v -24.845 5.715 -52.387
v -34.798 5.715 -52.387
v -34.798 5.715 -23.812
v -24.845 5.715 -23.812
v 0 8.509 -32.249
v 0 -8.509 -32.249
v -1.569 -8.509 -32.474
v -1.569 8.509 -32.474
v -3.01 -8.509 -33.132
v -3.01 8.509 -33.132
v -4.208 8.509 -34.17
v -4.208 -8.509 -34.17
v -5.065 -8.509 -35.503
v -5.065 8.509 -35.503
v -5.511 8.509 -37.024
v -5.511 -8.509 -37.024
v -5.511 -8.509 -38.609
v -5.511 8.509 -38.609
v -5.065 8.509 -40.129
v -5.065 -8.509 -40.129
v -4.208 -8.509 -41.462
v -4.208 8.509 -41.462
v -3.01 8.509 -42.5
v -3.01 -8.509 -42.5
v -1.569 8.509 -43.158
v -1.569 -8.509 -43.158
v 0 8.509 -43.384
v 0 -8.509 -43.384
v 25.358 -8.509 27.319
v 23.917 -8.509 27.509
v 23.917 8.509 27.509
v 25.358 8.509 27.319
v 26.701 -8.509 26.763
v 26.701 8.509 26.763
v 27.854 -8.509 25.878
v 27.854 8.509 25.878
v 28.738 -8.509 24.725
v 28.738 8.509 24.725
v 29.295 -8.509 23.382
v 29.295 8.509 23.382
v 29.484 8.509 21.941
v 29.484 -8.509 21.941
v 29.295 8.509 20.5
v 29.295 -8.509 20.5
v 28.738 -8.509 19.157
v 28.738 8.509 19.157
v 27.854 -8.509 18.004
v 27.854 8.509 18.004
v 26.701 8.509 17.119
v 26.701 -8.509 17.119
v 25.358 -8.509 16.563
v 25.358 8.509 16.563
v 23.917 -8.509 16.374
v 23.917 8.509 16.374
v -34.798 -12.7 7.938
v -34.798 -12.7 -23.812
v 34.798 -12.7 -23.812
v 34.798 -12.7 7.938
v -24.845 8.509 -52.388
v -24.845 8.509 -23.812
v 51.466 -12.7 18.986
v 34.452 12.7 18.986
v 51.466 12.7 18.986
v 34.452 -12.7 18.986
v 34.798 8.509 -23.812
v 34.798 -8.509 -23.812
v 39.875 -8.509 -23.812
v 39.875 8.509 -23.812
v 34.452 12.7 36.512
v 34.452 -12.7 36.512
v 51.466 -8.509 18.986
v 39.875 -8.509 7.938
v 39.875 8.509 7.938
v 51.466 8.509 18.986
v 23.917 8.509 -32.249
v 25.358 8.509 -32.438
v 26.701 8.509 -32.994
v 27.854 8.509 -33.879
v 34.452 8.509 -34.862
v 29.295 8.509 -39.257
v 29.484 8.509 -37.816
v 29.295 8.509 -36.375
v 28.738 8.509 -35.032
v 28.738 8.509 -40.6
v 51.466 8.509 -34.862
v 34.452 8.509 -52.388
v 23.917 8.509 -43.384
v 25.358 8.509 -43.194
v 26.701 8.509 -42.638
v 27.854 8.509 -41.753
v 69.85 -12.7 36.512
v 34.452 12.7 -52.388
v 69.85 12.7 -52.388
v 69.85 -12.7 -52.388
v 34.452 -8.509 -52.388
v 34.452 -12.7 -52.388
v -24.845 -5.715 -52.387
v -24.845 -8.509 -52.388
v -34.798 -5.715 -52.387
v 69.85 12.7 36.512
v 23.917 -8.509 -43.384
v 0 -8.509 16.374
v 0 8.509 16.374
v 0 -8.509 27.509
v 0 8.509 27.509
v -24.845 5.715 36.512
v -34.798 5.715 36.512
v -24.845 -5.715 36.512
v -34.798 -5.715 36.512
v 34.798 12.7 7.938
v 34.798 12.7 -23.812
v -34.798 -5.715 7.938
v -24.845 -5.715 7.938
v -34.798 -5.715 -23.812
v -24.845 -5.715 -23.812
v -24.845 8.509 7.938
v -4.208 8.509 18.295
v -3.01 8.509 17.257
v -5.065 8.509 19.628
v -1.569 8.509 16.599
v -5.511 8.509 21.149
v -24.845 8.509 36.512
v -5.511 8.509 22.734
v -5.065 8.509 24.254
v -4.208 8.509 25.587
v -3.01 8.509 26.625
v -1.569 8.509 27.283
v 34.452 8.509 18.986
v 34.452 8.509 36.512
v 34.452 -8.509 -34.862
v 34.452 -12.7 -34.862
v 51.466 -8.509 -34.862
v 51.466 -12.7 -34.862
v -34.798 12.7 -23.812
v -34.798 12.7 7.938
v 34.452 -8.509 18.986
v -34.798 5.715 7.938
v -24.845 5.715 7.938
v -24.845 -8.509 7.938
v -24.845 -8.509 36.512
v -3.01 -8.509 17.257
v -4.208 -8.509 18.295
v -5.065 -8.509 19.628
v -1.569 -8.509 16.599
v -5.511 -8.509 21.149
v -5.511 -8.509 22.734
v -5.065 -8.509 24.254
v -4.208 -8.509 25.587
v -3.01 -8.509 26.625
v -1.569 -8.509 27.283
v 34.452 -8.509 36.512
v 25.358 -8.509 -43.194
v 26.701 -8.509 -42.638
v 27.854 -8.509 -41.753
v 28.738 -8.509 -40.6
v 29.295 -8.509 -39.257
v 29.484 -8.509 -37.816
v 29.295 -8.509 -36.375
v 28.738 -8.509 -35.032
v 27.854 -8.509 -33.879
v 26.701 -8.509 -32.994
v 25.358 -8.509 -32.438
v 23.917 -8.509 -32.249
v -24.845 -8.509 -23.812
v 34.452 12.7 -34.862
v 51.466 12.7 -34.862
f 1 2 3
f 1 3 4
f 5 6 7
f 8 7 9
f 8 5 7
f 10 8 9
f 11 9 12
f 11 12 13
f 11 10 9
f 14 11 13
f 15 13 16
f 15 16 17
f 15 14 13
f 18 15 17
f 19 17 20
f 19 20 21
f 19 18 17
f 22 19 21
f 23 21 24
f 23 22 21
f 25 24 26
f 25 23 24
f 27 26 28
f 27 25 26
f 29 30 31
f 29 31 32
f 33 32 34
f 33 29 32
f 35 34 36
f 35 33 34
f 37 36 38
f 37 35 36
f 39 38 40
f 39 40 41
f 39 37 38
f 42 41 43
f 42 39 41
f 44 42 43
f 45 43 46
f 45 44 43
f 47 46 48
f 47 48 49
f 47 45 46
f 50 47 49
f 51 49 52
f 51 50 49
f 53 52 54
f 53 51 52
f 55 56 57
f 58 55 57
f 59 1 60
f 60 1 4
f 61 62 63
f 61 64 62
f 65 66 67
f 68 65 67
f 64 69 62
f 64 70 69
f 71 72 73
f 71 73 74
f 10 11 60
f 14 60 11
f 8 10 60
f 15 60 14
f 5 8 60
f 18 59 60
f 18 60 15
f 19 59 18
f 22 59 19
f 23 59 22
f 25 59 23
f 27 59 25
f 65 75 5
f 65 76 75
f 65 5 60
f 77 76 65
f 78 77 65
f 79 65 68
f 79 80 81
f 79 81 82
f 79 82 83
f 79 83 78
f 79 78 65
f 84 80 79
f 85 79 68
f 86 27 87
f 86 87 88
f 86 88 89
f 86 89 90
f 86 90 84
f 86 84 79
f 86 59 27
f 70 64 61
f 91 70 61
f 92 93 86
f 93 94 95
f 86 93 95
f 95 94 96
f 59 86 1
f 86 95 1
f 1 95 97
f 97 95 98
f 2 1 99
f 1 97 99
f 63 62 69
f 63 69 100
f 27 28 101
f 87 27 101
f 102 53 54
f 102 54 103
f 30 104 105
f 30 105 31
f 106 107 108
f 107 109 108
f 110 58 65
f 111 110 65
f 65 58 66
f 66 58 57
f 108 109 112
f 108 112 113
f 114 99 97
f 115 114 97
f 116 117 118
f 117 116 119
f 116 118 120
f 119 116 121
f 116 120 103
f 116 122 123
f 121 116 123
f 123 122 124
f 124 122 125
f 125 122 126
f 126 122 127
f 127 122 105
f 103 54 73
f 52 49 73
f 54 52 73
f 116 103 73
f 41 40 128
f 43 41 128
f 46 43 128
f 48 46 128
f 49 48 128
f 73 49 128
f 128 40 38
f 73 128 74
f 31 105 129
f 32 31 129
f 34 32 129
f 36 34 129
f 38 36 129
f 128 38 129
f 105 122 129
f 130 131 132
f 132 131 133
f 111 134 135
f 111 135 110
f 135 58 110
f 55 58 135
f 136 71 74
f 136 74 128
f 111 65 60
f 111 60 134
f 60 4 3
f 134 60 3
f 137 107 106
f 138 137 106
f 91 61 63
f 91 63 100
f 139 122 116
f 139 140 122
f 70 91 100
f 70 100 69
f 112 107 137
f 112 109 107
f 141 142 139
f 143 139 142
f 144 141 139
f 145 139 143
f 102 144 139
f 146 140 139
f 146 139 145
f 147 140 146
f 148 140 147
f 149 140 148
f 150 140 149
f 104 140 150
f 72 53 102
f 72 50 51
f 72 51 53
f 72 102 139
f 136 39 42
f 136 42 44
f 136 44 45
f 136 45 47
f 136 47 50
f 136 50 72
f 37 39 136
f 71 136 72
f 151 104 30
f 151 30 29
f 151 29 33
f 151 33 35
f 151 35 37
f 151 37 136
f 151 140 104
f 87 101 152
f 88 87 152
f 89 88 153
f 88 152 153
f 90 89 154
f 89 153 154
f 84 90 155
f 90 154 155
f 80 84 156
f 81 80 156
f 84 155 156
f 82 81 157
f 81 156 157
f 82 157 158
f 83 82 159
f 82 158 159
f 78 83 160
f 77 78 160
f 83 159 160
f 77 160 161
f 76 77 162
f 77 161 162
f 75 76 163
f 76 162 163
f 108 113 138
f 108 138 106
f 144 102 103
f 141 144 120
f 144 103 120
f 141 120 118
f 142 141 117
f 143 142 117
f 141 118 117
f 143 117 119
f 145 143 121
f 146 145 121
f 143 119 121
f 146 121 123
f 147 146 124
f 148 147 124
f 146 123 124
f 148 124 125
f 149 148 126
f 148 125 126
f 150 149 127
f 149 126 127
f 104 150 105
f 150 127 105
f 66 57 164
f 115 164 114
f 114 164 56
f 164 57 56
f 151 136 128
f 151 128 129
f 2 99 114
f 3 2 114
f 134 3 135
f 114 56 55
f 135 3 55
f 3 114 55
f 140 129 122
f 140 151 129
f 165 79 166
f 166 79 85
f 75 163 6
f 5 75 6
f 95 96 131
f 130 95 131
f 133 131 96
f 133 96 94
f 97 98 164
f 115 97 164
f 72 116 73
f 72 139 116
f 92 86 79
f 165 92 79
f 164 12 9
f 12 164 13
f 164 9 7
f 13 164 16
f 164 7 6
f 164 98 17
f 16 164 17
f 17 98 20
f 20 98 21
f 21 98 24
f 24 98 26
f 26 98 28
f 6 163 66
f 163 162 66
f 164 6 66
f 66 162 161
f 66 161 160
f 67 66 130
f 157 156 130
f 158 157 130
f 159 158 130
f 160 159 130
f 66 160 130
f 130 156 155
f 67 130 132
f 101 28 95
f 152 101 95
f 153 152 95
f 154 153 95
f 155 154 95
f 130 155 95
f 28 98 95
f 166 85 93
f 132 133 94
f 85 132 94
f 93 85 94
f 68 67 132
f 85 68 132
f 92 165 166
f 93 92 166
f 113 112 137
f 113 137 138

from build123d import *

# Parameters (mm, degrees)
F1_DEPTH = 12.7
F2_DEPTH = 8.509
F0_W     = 9.9534935624
F0_H     = 14.2875
F3_DEPTH = 5.715


with BuildPart() as f1:
    # F0 (on Front) → F1 (new body, symmetric)
    with BuildSketch(Plane.XZ):
        Polygon((34.4515740871, 18.9865), (51.4656116075, 18.9865), (69.85, 36.5125), (34.4515740871, 36.5125), align=None)
    extrude(amount=F1_DEPTH, both=True)


with BuildPart() as f1b:
    # F0 (on Front) → F1, piece 2 (new body, symmetric)
    with BuildSketch(Plane.XZ):
        Polygon((-24.8445064376, 7.9375), (-34.798, 7.9375), (-34.798, -7.9375), (34.798, -7.9375), (34.798, 7.9375), align=None)
    extrude(amount=F1_DEPTH, both=True)



with BuildPart() as f2:
    # F0 (on Front) → F2 (new body, symmetric)
    with BuildSketch(Plane.XZ):
        Polygon((-24.8445064376, 22.225), (-24.8445064376, 7.9375), (34.798, 7.9375), (39.8754537078, 7.9375), (51.4656116075, 18.9865), (34.4515740871, 18.9865), (34.4515740871, 36.5125), (-24.8445064376, 36.5125), align=None)
        with BuildLine():
            ThreePointArc((0, 16.3735247751), (-5.5676602225, 21.9411849976), (0, 27.50884522))
            Line((0, 27.50884522), (23.9166795551, 27.50884522))
            ThreePointArc((23.9166795551, 27.50884522), (27.8536098537, 25.8781152962), (29.4843397775, 21.9411849976))
            ThreePointArc((29.4843397775, 21.9411849976), (27.8536098537, 18.0042546989), (23.9166795551, 16.3735247751))
            Line((23.9166795551, 16.3735247751), (0, 16.3735247751))
        make_face(mode=Mode.SUBTRACT)
    extrude(amount=F2_DEPTH, both=True)


with BuildPart() as f3:
    # F0 (on Front) → F3 (new body, symmetric)
    with BuildSketch(Plane.XZ):
        with Locations((-29.8212532188, 29.36875)):
            Rectangle(F0_W, F0_H)
        with Locations((-29.8212532188, 15.08125)):
            Rectangle(F0_W, F0_H)
    extrude(amount=F3_DEPTH, both=True)


with BuildPart() as f1b_1:
    add(f1b.part)
    # F4: F3, F2, F1, F1b across face
    add(f3.part.mirror(Plane(origin=(0, 0, -7.9375), x_dir=(1, 0, 0), z_dir=(0, 0, -1))))
    add(f2.part.mirror(Plane(origin=(0, 0, -7.9375), x_dir=(1, 0, 0), z_dir=(0, 0, -1))))
    add(f1.part.mirror(Plane(origin=(0, 0, -7.9375), x_dir=(1, 0, 0), z_dir=(0, 0, -1))))
    add(f1b.part.mirror(Plane(origin=(0, 0, -7.9375), x_dir=(1, 0, 0), z_dir=(0, 0, -1))))


solid = Compound([f1.part, f2.part, f3.part, f1b_1.part])
